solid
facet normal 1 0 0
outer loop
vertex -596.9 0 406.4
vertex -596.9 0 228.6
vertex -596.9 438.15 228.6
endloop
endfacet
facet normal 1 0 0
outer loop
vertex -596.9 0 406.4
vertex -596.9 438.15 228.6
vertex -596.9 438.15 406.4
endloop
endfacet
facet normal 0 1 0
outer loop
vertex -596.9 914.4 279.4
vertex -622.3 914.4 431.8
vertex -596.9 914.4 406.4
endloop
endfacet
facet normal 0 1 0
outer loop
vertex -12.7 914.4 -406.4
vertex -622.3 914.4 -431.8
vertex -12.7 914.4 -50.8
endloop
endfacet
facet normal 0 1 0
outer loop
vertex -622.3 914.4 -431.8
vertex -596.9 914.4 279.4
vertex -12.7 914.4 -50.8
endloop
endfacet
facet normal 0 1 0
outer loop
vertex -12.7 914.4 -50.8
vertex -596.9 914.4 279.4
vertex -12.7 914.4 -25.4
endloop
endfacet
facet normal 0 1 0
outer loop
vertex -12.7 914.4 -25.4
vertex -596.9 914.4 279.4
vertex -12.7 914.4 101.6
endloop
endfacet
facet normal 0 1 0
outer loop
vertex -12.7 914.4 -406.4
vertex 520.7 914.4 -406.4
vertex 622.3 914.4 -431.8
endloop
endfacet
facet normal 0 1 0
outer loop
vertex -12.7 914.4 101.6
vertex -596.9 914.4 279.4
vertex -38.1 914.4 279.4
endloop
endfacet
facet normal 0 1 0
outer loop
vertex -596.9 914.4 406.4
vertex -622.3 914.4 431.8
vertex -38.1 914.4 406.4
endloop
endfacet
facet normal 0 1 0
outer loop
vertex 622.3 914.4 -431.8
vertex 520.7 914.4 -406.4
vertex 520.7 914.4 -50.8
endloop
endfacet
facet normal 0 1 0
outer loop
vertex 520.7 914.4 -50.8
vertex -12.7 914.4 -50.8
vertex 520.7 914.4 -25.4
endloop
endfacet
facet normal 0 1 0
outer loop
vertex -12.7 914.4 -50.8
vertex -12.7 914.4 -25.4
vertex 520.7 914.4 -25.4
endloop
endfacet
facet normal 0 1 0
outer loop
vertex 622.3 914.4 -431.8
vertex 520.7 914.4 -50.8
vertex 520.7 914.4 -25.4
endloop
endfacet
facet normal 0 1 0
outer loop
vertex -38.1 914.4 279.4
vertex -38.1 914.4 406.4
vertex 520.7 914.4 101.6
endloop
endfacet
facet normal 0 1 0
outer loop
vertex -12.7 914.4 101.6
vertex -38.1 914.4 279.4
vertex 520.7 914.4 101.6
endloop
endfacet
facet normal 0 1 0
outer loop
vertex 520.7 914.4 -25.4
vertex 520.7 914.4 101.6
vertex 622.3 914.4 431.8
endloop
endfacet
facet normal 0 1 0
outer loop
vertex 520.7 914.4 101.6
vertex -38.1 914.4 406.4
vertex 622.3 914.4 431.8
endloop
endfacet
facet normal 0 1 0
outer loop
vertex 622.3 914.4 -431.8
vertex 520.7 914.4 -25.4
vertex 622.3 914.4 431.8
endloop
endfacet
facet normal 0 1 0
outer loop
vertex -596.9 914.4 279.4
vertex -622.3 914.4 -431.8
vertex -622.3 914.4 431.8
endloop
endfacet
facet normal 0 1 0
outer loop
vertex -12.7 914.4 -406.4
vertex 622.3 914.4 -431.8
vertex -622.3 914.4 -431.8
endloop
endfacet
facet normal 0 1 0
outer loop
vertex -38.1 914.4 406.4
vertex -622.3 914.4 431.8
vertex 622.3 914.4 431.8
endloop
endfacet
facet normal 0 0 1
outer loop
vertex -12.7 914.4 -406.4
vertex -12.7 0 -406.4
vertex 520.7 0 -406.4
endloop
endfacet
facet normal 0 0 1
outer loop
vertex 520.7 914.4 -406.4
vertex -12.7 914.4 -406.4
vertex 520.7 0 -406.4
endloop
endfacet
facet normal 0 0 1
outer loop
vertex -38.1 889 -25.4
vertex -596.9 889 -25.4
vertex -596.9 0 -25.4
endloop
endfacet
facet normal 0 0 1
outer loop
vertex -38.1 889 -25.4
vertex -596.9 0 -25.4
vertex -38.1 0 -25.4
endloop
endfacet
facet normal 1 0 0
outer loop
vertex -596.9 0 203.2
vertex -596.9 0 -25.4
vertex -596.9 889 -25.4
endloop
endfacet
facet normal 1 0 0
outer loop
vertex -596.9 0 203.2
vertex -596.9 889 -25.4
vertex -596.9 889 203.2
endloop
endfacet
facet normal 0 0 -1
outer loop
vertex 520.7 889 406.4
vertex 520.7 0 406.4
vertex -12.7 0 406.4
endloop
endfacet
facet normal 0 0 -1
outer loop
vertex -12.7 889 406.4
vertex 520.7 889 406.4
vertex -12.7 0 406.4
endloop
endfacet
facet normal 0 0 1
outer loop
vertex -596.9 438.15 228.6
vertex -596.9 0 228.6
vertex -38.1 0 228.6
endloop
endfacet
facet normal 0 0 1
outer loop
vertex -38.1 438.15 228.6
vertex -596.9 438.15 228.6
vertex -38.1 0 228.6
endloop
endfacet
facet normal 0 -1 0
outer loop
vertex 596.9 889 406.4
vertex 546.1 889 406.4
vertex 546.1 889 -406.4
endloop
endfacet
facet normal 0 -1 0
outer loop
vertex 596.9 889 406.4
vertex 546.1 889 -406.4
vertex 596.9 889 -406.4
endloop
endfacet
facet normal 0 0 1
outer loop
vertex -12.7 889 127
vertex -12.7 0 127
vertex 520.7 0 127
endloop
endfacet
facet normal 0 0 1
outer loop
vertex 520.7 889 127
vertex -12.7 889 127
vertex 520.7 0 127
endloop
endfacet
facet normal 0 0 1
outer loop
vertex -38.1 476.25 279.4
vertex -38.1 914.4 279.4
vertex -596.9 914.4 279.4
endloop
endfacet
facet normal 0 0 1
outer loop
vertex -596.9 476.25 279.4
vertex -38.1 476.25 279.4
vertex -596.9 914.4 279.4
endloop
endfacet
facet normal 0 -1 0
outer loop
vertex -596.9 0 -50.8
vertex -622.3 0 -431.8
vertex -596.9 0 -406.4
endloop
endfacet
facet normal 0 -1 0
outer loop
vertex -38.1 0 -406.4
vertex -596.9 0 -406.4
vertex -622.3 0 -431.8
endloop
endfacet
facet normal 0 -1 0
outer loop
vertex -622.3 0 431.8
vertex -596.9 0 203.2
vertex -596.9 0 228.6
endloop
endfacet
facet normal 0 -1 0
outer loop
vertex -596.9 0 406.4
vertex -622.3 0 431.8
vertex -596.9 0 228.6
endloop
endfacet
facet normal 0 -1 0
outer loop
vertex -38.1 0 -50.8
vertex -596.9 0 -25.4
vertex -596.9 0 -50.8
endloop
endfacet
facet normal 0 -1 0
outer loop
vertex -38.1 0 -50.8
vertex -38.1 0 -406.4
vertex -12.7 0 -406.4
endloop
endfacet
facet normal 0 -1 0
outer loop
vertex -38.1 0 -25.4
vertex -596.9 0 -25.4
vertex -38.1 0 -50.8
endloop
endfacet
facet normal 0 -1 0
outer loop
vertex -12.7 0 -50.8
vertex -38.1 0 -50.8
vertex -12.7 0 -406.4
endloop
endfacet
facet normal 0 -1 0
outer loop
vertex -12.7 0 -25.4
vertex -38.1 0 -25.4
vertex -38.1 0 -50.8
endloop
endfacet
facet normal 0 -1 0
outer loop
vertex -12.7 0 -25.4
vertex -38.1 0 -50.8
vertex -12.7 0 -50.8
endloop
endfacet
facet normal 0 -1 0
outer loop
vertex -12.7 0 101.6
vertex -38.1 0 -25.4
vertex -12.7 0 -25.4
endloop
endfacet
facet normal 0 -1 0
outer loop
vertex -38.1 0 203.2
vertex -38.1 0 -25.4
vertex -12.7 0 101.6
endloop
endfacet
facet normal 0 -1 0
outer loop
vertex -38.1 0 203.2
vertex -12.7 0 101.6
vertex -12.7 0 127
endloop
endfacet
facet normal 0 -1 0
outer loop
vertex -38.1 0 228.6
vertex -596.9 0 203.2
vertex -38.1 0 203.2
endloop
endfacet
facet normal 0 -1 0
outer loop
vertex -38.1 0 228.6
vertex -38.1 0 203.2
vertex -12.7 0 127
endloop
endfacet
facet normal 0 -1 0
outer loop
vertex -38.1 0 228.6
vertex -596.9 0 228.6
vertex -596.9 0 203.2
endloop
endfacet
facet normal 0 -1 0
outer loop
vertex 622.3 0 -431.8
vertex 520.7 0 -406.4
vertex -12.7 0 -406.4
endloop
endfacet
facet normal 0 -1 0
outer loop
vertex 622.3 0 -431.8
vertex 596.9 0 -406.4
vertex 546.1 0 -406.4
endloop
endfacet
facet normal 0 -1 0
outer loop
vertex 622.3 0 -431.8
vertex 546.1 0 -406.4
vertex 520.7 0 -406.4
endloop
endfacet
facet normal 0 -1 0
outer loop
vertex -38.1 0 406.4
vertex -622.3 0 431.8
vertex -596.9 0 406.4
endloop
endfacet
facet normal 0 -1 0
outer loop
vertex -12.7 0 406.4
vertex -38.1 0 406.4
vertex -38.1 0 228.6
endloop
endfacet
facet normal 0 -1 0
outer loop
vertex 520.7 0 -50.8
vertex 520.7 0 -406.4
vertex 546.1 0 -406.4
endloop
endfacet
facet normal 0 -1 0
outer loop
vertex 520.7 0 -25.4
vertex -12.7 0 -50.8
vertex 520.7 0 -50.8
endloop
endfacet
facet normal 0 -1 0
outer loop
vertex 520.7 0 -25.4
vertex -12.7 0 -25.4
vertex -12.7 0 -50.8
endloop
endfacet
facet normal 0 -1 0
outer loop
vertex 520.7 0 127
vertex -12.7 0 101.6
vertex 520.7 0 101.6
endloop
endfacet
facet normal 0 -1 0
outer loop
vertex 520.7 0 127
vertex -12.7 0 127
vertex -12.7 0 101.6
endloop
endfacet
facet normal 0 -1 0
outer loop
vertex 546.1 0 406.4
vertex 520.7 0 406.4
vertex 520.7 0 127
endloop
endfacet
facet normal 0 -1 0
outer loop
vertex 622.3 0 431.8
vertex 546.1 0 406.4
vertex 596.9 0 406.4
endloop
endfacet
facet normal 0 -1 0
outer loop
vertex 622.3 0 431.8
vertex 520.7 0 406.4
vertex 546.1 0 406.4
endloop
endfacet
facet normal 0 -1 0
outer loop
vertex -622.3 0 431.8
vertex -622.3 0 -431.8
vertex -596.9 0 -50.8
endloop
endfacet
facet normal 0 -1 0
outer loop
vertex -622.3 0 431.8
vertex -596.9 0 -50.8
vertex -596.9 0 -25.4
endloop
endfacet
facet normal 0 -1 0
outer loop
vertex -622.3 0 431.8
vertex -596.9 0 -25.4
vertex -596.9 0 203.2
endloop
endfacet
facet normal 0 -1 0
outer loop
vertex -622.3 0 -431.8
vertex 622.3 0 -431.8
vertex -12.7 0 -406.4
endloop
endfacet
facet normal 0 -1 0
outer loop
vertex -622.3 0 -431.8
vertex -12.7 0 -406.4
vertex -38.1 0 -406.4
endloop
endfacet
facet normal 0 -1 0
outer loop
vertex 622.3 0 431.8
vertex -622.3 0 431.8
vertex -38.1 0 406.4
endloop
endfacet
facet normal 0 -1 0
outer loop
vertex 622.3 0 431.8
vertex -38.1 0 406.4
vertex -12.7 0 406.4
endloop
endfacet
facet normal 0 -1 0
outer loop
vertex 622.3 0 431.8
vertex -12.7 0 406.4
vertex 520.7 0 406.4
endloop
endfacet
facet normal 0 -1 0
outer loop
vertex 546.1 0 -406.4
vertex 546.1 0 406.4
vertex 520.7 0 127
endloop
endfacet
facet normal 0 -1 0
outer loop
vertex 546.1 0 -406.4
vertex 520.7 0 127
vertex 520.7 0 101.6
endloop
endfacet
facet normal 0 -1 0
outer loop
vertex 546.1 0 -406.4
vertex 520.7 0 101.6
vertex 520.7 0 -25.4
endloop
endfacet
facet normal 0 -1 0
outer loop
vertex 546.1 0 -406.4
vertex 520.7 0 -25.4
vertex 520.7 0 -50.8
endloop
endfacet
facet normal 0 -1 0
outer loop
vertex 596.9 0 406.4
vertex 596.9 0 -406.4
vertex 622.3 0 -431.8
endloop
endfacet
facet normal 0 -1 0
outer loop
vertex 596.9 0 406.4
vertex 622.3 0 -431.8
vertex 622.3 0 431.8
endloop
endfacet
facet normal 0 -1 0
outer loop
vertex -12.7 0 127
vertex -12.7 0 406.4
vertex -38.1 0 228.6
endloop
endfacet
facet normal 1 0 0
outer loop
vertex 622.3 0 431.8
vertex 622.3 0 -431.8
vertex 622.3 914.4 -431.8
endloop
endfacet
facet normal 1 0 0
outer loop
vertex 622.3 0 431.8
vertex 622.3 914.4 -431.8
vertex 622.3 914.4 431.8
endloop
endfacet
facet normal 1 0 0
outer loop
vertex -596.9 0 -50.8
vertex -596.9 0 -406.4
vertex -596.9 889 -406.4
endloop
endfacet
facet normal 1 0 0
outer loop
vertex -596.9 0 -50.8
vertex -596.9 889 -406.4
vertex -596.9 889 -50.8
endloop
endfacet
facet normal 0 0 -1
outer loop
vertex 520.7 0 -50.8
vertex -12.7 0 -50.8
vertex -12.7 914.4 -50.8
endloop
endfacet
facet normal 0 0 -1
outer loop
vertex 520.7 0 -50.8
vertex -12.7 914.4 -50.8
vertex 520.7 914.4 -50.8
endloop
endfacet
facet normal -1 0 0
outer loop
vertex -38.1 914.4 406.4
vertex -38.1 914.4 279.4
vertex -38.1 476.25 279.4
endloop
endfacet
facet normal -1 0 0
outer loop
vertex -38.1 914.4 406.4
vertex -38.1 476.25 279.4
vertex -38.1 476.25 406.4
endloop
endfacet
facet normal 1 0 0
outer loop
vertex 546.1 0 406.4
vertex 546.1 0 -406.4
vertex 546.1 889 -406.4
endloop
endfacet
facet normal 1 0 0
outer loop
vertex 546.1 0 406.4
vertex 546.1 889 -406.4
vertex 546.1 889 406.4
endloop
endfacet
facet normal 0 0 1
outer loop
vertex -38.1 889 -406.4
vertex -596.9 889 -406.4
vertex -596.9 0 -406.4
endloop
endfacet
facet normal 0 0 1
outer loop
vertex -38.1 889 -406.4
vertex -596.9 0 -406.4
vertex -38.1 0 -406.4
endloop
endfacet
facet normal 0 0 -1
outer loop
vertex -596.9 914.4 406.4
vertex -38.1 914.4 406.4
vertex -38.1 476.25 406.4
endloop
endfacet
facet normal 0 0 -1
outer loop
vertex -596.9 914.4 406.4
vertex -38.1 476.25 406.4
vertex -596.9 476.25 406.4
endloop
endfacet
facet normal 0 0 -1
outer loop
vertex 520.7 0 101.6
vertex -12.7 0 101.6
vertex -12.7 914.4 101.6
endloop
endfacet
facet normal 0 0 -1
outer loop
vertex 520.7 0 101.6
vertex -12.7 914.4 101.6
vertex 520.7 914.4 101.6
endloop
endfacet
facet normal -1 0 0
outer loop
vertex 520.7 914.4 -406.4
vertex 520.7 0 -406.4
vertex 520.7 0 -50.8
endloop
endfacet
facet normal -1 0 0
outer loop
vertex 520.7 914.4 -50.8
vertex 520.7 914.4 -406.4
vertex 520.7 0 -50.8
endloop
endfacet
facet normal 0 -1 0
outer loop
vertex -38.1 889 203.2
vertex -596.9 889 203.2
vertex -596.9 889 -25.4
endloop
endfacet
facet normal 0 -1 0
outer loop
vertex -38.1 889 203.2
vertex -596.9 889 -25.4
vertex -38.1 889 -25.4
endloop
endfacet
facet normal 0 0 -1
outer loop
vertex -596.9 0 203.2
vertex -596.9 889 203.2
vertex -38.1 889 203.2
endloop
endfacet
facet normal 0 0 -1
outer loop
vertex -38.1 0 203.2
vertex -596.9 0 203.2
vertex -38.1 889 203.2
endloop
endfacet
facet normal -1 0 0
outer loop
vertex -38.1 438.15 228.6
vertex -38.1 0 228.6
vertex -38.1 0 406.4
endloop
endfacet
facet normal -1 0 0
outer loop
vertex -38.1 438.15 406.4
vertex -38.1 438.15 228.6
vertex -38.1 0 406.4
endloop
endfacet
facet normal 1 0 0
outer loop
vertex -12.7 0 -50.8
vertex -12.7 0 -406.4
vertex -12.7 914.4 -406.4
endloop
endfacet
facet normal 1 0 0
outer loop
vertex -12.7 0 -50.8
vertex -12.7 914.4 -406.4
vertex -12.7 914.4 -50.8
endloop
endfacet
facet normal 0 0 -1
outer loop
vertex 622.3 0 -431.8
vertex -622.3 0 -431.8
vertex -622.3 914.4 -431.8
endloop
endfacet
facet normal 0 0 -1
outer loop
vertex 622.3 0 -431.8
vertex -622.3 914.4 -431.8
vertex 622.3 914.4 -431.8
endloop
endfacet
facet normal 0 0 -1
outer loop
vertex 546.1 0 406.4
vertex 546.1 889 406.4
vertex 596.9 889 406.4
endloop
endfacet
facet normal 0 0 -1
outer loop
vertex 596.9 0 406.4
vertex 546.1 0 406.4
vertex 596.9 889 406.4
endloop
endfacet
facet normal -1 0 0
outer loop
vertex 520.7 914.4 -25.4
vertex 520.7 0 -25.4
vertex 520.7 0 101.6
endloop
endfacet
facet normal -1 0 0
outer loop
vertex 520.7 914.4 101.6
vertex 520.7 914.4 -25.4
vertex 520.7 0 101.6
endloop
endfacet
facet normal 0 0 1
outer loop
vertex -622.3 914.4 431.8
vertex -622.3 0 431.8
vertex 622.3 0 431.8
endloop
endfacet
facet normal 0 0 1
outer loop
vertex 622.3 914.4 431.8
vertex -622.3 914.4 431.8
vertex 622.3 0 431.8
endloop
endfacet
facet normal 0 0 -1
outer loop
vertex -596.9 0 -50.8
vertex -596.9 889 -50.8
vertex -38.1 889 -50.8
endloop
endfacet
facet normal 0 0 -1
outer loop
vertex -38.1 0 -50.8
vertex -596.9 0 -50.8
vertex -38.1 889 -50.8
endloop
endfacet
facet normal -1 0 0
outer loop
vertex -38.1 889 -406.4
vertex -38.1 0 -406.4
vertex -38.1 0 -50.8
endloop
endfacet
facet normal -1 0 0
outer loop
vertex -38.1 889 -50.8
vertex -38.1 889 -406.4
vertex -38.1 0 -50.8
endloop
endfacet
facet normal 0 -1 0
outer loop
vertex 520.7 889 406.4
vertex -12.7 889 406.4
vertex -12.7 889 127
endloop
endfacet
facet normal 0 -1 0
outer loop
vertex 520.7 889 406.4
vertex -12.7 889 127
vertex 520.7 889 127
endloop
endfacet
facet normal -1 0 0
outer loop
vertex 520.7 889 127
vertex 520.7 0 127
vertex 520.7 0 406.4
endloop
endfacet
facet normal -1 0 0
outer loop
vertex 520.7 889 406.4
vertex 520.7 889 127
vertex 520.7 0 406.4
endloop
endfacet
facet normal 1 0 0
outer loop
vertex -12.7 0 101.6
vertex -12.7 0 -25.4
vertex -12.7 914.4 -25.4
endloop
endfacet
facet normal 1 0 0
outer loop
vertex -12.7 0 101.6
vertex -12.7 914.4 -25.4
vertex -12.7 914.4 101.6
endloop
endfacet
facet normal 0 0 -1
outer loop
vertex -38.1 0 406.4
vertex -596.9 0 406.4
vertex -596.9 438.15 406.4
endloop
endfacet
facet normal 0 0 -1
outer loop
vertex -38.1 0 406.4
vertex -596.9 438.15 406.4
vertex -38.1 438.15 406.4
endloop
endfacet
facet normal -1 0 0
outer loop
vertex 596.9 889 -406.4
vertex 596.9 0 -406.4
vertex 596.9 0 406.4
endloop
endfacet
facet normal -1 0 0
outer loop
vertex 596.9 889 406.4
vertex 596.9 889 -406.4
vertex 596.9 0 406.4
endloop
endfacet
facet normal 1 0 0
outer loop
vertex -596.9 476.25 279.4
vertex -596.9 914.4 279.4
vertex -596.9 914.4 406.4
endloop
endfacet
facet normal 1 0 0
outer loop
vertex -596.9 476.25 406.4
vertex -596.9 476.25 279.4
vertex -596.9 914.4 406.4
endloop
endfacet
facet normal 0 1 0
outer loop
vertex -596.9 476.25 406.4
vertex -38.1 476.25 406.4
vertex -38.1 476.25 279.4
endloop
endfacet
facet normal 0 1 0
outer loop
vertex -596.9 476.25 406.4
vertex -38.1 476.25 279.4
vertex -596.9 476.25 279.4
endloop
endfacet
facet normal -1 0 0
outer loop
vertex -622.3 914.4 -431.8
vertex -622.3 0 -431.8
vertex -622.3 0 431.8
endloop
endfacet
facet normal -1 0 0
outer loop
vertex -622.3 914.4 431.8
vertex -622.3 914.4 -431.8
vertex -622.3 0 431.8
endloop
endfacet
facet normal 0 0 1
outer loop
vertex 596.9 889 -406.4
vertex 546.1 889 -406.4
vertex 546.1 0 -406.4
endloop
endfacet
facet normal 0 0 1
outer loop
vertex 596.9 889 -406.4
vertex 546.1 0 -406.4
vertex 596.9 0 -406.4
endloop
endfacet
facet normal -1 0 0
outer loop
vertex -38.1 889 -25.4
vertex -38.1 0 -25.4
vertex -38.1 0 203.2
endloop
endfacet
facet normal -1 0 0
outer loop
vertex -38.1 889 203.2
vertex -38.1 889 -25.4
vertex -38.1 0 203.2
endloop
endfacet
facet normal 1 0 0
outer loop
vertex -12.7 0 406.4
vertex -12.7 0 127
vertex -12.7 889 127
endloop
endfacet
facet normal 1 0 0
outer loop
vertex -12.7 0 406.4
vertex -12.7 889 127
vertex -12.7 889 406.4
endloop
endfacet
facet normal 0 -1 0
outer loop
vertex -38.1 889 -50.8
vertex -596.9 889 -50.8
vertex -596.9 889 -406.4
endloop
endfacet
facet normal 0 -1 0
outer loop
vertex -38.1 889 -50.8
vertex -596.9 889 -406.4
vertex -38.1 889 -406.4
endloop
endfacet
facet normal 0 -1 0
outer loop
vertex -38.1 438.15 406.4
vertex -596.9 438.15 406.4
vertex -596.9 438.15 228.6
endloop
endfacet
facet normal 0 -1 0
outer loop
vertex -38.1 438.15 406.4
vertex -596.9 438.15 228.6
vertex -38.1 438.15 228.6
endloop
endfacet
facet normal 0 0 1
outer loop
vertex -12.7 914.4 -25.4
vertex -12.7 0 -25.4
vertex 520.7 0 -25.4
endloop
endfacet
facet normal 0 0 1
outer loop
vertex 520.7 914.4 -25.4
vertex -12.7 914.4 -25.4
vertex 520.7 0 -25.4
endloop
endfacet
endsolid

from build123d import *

# Parameters (mm, degrees)
F0_W      = 1244.6
F0_H      = 863.6
F1_DEPTH  = 914.4
F2_W      = 558.8
F2_H      = 355.6
F3_DEPTH  = 889
F4_W      = 558.8
F4_H      = 228.6
F5_DEPTH  = 889
F6_W      = 558.8
F6_H      = 177.8
F7_DEPTH  = 438.15
F8_W      = 558.8
F8_H      = 127
F9_DEPTH  = 438.15
F10_W     = 533.4
F10_H     = 127
F11_DEPTH = 914.4
F12_W     = 533.4
F12_H     = 355.6
F13_DEPTH = 914.4
F14_W     = 50.8
F14_H     = 812.8
F15_DEPTH = 889
F16_W     = 520.7
F16_H     = 279.4
F16_W_2   = 12.7
F17_DEPTH = 889


with BuildPart() as f1:
    # F0 (on Front) → F1 (new body)
    with BuildSketch(Plane.XZ):
        Rectangle(F0_W, F0_H)
    extrude(amount=-F1_DEPTH)

    # F2 (on face) → F3 (cut)
    with BuildSketch(Plane.XZ):
        with Locations((-317.5, -228.6)):
            Rectangle(F2_W, F2_H)
    extrude(amount=-F3_DEPTH, mode=Mode.SUBTRACT)

    # F4 (on face) → F5 (cut)
    with BuildSketch(Plane.XZ):
        with Locations((-317.5, 88.9)):
            Rectangle(F4_W, F4_H)
    extrude(amount=-F5_DEPTH, mode=Mode.SUBTRACT)

    # F6 (on face) → F7 (cut)
    with BuildSketch(Plane.XZ):
        with Locations((-317.5, 317.5)):
            Rectangle(F6_W, F6_H)
    extrude(amount=-F7_DEPTH, mode=Mode.SUBTRACT)

    # F8 (on face) → F9 (cut)
    with BuildSketch(Plane(origin=(0, 914.4, 0), x_dir=(-1, 0, 0), z_dir=(0, 1, 0))):
        with Locations((317.5, 342.9)):
            Rectangle(F8_W, F8_H)
    extrude(amount=-F9_DEPTH, mode=Mode.SUBTRACT)

    # F10 (on face) → F11 (cut)
    with BuildSketch(Plane.XZ):
        with Locations((254, 38.1)):
            Rectangle(F10_W, F10_H)
    extrude(amount=-F11_DEPTH, mode=Mode.SUBTRACT)

    # F12 (on face) → F13 (cut)
    with BuildSketch(Plane.XZ):
        with Locations((254, -228.6)):
            Rectangle(F12_W, F12_H)
    extrude(amount=-F13_DEPTH, mode=Mode.SUBTRACT)

    # F14 (on face) → F15 (cut)
    with BuildSketch(Plane.XZ):
        with Locations((571.5, 0)):
            Rectangle(F14_W, F14_H)
    extrude(amount=-F15_DEPTH, mode=Mode.SUBTRACT)

    # F16 (on face) → F17 (cut)
    with BuildSketch(Plane.XZ):
        with Locations((260.35, 266.7)):
            Rectangle(F16_W, F16_H)
        with Locations((-6.35, 266.7)):
            Rectangle(F16_W_2, F16_H)
    extrude(amount=-F17_DEPTH, mode=Mode.SUBTRACT)


solid = f1.part
